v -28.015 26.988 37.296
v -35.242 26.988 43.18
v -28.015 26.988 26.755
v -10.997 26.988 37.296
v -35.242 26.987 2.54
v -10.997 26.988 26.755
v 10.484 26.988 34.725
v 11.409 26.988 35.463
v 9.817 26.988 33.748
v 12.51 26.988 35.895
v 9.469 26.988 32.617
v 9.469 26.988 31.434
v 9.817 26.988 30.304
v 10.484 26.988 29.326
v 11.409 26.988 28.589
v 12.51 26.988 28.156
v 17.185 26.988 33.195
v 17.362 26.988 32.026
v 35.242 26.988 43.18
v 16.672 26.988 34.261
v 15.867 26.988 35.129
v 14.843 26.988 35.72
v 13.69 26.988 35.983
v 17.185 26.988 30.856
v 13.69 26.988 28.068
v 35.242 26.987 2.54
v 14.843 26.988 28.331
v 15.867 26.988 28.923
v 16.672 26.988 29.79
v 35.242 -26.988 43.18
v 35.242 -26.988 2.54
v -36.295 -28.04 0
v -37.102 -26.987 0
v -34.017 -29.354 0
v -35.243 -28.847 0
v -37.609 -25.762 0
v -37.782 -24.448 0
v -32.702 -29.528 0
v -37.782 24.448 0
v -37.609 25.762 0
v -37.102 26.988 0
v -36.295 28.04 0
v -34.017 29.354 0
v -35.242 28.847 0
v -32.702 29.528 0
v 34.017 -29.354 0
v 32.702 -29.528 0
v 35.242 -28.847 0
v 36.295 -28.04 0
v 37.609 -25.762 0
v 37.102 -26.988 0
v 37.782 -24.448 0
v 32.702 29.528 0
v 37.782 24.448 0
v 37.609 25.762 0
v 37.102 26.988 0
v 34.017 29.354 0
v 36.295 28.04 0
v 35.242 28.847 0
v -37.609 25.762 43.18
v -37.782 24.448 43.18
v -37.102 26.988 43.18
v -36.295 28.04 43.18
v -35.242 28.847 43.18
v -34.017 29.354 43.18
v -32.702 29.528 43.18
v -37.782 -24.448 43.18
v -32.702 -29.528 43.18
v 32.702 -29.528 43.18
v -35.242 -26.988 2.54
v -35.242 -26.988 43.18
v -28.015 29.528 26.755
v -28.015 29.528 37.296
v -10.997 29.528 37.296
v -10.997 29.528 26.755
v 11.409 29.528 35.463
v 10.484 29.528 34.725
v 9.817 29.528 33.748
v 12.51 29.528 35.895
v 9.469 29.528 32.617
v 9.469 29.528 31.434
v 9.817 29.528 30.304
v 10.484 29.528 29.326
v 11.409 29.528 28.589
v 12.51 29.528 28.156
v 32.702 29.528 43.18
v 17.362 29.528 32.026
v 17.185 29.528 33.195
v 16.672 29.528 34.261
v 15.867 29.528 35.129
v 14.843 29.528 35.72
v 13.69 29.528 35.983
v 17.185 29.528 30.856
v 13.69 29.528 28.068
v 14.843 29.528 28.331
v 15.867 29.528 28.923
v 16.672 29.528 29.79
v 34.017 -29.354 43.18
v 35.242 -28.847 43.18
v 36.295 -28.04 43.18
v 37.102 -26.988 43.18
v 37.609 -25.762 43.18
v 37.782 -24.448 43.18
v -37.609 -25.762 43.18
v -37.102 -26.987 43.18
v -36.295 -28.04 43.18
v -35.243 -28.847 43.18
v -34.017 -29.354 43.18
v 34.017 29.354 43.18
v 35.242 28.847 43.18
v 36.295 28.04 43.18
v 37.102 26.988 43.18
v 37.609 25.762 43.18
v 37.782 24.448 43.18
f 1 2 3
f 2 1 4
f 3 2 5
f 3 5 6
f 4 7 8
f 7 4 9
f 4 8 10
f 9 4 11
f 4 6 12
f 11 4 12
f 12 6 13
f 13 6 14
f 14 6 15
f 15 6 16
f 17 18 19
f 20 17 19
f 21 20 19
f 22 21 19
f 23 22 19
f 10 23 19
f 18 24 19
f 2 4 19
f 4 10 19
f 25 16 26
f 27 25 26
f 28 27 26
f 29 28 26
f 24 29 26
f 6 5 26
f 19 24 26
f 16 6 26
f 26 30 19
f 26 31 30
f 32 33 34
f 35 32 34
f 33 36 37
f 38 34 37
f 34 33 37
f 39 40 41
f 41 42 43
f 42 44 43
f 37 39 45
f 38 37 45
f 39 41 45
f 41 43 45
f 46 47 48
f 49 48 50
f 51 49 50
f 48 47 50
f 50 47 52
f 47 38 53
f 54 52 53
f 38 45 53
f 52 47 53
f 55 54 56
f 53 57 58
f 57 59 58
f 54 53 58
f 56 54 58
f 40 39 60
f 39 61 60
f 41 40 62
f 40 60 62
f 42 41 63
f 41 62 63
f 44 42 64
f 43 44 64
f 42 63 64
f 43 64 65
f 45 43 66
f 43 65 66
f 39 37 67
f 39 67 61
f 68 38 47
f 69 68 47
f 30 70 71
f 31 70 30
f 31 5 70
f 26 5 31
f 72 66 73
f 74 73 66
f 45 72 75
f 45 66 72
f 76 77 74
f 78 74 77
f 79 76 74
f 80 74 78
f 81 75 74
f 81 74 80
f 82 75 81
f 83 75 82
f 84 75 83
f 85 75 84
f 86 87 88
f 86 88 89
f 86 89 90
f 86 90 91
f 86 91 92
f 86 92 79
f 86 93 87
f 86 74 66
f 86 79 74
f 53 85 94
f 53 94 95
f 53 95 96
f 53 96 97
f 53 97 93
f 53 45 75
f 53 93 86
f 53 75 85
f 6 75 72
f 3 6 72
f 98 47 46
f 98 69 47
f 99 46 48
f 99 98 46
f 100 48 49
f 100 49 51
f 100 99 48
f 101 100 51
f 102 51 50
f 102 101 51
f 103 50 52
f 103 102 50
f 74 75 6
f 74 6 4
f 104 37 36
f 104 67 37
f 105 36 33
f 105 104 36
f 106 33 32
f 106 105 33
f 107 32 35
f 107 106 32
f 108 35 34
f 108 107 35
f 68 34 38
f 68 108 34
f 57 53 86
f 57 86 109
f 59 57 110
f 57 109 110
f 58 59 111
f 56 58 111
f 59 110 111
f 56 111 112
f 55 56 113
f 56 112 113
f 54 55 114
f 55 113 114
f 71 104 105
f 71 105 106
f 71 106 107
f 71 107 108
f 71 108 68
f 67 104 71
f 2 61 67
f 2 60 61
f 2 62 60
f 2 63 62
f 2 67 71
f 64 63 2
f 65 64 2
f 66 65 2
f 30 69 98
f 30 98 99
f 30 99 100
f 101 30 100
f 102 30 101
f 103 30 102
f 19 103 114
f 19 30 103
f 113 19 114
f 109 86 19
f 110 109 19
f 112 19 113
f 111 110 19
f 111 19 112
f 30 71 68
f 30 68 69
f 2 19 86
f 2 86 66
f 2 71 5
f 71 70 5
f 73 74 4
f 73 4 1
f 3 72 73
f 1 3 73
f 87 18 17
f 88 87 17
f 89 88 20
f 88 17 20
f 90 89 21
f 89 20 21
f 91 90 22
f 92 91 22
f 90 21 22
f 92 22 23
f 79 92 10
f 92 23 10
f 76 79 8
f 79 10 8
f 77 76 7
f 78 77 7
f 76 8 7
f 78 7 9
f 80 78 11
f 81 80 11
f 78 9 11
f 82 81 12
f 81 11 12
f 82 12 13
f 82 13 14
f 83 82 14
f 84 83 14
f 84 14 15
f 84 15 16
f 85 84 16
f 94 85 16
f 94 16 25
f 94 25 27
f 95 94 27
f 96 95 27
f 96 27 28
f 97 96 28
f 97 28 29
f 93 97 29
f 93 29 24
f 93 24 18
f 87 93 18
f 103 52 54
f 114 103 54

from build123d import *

# Parameters (mm, degrees)
F0_W     = 75.565
F0_H     = 59.055
F1_DEPTH = 43.18
F2_T     = -2.54
F3_W     = 17.018
F3_H     = 10.541
F4_DEPTH = 3.302
F6_D     = 7.9375
F6_DEPTH = 12.7
F6_TIP   = 2.3846655818
F7_R     = 5.08


# Not quite as in the source:
# - a feature names something its author has since deleted; it is built from what else it names


with BuildPart() as f1:
    # F0 (on Top) → F1 (new body)
    with BuildSketch(Plane.XY):
        Rectangle(F0_W, F0_H)
    extrude(amount=F1_DEPTH)

    # F2
    f2_openings = [f1.faces().sort_by_distance(p)[0] for p in [
        (0, 0, 43.18),
    ]]
    offset(amount=F2_T, openings=f2_openings)

    # F3 (on face) → F4 (cut)
    with BuildSketch(Plane(origin=(0, 29.5275, 0), x_dir=(-1, 0, 0), z_dir=(0, 1, 0))):
        with Locations((19.5056423545, 32.0256687701)):
            Rectangle(F3_W, F3_H)
    extrude(amount=-F4_DEPTH, mode=Mode.SUBTRACT)

    # F6
    with Locations(Plane(origin=(0, 29.5275, 0), x_dir=(-1, 0, 0), z_dir=(0, 1, 0))):
        with Locations((-13.3929288228, 32.0256687701)):
            Hole(F6_D / 2, depth=F6_DEPTH)
            with Locations((0, 0, -(F6_DEPTH + F6_TIP / 2))):  # 118° drill point
                Cone(0, F6_D / 2, F6_TIP, mode=Mode.SUBTRACT)

    # F7
    f7_edges = [f1.edges().sort_by_distance(p)[0] for p in [
        (-37.7825, -29.5275, 21.59),
        (37.7825, -29.5275, 21.59),
        (37.7825, 29.5275, 21.59),
        (-37.7825, 29.5275, 21.59),
    ]]
    fillet(f7_edges, radius=F7_R)


solid = f1.part
